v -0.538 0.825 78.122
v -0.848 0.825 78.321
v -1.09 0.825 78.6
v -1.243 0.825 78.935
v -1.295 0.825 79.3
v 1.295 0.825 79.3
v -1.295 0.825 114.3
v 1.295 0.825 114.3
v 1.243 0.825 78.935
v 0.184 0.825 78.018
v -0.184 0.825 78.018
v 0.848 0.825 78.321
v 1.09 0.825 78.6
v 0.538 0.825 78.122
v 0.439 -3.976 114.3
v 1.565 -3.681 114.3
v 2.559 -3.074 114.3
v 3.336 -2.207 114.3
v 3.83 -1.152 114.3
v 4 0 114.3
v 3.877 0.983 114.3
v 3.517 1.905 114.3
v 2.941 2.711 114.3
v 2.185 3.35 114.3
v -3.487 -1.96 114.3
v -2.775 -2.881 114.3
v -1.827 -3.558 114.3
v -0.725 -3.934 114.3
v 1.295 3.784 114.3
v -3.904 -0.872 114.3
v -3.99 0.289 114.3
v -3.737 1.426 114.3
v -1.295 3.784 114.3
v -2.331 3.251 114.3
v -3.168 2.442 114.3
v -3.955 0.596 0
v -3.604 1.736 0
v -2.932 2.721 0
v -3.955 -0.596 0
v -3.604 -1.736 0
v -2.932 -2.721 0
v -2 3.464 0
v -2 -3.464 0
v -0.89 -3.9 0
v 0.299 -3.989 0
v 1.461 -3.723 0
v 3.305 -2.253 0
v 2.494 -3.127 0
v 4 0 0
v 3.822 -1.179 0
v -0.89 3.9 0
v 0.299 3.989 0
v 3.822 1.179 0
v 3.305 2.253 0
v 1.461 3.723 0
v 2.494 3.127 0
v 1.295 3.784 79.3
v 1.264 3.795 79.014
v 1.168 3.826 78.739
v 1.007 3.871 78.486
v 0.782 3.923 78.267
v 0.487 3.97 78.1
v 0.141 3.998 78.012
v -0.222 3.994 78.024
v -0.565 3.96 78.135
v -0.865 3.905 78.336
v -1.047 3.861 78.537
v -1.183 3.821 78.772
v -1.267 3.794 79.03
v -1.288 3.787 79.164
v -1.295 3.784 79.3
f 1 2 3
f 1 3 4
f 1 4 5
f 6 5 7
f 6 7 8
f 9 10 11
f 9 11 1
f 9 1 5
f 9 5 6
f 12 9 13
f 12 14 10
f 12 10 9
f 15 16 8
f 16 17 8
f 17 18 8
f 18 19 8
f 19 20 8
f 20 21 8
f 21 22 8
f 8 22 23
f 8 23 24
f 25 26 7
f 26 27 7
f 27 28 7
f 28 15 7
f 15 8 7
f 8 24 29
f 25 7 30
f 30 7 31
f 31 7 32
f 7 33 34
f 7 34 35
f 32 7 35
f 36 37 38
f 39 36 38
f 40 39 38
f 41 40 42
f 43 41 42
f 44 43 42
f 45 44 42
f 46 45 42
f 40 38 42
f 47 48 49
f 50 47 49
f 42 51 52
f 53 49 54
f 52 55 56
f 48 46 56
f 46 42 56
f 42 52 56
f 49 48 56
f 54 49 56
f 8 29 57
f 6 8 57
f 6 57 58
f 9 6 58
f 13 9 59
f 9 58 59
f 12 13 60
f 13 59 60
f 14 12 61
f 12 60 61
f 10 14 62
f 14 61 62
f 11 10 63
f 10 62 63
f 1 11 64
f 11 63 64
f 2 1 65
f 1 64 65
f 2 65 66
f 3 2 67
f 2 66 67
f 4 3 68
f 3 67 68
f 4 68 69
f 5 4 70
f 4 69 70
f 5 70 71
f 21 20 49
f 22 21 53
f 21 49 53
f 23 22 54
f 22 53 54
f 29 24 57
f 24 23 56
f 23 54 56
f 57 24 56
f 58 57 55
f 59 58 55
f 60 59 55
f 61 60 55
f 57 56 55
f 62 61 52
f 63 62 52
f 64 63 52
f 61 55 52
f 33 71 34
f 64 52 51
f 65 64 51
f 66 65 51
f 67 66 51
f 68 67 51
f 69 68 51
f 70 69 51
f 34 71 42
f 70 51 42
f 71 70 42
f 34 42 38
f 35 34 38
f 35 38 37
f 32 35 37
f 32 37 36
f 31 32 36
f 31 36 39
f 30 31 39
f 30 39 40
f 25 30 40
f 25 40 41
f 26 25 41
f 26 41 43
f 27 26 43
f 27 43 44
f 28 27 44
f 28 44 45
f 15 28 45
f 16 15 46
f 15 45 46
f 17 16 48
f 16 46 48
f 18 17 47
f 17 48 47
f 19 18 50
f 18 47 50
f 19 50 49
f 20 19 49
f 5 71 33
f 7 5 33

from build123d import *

# Parameters (mm, degrees)
SKETCH1_R           = 4
BOSS_EXTRUDE1_DEPTH = 114.3
BOSS_EXTRUDE2_DEPTH = 35
CUT_EXTRUDE1_DEPTH  = 5.596433308


with BuildPart() as part:
    # Sketch1 → Boss-Extrude1 (new body)
    with BuildSketch(Plane.XY):
        Circle(SKETCH1_R)
    extrude(amount=BOSS_EXTRUDE1_DEPTH)

    # Sketch2 → Boss-Extrude2 (add)
    with BuildSketch(Plane.XY.offset(114.3)):
        Polygon((-1.2954, 3.421433318), (-1.2954, 6.421433318), (1.2954, 6.421433318), (1.2954, 3.421433318), (1.2954, 0.825), (0, 0.825), (-1.2954, 0.825), align=None)
    extrude(amount=-BOSS_EXTRUDE2_DEPTH)

    # Sketch3 → Cut-Extrude1 (cut)
    with BuildSketch(Plane(origin=(0, 6.421433318, 0), x_dir=(1, 0, 0), z_dir=(0, 1, 0))):
        with BuildLine():
            Line((-1.2954, -79.3), (-1.2954, -114.3))
            Line((-1.2954, -114.3), (1.2954, -114.3))
            Line((1.2954, -114.3), (1.2954, -79.3))
            ThreePointArc((1.2954, -79.3), (0, -78.0046), (-1.2954, -79.3))
        make_face()
    extrude(amount=-CUT_EXTRUDE1_DEPTH, mode=Mode.SUBTRACT)


solid = part.part
